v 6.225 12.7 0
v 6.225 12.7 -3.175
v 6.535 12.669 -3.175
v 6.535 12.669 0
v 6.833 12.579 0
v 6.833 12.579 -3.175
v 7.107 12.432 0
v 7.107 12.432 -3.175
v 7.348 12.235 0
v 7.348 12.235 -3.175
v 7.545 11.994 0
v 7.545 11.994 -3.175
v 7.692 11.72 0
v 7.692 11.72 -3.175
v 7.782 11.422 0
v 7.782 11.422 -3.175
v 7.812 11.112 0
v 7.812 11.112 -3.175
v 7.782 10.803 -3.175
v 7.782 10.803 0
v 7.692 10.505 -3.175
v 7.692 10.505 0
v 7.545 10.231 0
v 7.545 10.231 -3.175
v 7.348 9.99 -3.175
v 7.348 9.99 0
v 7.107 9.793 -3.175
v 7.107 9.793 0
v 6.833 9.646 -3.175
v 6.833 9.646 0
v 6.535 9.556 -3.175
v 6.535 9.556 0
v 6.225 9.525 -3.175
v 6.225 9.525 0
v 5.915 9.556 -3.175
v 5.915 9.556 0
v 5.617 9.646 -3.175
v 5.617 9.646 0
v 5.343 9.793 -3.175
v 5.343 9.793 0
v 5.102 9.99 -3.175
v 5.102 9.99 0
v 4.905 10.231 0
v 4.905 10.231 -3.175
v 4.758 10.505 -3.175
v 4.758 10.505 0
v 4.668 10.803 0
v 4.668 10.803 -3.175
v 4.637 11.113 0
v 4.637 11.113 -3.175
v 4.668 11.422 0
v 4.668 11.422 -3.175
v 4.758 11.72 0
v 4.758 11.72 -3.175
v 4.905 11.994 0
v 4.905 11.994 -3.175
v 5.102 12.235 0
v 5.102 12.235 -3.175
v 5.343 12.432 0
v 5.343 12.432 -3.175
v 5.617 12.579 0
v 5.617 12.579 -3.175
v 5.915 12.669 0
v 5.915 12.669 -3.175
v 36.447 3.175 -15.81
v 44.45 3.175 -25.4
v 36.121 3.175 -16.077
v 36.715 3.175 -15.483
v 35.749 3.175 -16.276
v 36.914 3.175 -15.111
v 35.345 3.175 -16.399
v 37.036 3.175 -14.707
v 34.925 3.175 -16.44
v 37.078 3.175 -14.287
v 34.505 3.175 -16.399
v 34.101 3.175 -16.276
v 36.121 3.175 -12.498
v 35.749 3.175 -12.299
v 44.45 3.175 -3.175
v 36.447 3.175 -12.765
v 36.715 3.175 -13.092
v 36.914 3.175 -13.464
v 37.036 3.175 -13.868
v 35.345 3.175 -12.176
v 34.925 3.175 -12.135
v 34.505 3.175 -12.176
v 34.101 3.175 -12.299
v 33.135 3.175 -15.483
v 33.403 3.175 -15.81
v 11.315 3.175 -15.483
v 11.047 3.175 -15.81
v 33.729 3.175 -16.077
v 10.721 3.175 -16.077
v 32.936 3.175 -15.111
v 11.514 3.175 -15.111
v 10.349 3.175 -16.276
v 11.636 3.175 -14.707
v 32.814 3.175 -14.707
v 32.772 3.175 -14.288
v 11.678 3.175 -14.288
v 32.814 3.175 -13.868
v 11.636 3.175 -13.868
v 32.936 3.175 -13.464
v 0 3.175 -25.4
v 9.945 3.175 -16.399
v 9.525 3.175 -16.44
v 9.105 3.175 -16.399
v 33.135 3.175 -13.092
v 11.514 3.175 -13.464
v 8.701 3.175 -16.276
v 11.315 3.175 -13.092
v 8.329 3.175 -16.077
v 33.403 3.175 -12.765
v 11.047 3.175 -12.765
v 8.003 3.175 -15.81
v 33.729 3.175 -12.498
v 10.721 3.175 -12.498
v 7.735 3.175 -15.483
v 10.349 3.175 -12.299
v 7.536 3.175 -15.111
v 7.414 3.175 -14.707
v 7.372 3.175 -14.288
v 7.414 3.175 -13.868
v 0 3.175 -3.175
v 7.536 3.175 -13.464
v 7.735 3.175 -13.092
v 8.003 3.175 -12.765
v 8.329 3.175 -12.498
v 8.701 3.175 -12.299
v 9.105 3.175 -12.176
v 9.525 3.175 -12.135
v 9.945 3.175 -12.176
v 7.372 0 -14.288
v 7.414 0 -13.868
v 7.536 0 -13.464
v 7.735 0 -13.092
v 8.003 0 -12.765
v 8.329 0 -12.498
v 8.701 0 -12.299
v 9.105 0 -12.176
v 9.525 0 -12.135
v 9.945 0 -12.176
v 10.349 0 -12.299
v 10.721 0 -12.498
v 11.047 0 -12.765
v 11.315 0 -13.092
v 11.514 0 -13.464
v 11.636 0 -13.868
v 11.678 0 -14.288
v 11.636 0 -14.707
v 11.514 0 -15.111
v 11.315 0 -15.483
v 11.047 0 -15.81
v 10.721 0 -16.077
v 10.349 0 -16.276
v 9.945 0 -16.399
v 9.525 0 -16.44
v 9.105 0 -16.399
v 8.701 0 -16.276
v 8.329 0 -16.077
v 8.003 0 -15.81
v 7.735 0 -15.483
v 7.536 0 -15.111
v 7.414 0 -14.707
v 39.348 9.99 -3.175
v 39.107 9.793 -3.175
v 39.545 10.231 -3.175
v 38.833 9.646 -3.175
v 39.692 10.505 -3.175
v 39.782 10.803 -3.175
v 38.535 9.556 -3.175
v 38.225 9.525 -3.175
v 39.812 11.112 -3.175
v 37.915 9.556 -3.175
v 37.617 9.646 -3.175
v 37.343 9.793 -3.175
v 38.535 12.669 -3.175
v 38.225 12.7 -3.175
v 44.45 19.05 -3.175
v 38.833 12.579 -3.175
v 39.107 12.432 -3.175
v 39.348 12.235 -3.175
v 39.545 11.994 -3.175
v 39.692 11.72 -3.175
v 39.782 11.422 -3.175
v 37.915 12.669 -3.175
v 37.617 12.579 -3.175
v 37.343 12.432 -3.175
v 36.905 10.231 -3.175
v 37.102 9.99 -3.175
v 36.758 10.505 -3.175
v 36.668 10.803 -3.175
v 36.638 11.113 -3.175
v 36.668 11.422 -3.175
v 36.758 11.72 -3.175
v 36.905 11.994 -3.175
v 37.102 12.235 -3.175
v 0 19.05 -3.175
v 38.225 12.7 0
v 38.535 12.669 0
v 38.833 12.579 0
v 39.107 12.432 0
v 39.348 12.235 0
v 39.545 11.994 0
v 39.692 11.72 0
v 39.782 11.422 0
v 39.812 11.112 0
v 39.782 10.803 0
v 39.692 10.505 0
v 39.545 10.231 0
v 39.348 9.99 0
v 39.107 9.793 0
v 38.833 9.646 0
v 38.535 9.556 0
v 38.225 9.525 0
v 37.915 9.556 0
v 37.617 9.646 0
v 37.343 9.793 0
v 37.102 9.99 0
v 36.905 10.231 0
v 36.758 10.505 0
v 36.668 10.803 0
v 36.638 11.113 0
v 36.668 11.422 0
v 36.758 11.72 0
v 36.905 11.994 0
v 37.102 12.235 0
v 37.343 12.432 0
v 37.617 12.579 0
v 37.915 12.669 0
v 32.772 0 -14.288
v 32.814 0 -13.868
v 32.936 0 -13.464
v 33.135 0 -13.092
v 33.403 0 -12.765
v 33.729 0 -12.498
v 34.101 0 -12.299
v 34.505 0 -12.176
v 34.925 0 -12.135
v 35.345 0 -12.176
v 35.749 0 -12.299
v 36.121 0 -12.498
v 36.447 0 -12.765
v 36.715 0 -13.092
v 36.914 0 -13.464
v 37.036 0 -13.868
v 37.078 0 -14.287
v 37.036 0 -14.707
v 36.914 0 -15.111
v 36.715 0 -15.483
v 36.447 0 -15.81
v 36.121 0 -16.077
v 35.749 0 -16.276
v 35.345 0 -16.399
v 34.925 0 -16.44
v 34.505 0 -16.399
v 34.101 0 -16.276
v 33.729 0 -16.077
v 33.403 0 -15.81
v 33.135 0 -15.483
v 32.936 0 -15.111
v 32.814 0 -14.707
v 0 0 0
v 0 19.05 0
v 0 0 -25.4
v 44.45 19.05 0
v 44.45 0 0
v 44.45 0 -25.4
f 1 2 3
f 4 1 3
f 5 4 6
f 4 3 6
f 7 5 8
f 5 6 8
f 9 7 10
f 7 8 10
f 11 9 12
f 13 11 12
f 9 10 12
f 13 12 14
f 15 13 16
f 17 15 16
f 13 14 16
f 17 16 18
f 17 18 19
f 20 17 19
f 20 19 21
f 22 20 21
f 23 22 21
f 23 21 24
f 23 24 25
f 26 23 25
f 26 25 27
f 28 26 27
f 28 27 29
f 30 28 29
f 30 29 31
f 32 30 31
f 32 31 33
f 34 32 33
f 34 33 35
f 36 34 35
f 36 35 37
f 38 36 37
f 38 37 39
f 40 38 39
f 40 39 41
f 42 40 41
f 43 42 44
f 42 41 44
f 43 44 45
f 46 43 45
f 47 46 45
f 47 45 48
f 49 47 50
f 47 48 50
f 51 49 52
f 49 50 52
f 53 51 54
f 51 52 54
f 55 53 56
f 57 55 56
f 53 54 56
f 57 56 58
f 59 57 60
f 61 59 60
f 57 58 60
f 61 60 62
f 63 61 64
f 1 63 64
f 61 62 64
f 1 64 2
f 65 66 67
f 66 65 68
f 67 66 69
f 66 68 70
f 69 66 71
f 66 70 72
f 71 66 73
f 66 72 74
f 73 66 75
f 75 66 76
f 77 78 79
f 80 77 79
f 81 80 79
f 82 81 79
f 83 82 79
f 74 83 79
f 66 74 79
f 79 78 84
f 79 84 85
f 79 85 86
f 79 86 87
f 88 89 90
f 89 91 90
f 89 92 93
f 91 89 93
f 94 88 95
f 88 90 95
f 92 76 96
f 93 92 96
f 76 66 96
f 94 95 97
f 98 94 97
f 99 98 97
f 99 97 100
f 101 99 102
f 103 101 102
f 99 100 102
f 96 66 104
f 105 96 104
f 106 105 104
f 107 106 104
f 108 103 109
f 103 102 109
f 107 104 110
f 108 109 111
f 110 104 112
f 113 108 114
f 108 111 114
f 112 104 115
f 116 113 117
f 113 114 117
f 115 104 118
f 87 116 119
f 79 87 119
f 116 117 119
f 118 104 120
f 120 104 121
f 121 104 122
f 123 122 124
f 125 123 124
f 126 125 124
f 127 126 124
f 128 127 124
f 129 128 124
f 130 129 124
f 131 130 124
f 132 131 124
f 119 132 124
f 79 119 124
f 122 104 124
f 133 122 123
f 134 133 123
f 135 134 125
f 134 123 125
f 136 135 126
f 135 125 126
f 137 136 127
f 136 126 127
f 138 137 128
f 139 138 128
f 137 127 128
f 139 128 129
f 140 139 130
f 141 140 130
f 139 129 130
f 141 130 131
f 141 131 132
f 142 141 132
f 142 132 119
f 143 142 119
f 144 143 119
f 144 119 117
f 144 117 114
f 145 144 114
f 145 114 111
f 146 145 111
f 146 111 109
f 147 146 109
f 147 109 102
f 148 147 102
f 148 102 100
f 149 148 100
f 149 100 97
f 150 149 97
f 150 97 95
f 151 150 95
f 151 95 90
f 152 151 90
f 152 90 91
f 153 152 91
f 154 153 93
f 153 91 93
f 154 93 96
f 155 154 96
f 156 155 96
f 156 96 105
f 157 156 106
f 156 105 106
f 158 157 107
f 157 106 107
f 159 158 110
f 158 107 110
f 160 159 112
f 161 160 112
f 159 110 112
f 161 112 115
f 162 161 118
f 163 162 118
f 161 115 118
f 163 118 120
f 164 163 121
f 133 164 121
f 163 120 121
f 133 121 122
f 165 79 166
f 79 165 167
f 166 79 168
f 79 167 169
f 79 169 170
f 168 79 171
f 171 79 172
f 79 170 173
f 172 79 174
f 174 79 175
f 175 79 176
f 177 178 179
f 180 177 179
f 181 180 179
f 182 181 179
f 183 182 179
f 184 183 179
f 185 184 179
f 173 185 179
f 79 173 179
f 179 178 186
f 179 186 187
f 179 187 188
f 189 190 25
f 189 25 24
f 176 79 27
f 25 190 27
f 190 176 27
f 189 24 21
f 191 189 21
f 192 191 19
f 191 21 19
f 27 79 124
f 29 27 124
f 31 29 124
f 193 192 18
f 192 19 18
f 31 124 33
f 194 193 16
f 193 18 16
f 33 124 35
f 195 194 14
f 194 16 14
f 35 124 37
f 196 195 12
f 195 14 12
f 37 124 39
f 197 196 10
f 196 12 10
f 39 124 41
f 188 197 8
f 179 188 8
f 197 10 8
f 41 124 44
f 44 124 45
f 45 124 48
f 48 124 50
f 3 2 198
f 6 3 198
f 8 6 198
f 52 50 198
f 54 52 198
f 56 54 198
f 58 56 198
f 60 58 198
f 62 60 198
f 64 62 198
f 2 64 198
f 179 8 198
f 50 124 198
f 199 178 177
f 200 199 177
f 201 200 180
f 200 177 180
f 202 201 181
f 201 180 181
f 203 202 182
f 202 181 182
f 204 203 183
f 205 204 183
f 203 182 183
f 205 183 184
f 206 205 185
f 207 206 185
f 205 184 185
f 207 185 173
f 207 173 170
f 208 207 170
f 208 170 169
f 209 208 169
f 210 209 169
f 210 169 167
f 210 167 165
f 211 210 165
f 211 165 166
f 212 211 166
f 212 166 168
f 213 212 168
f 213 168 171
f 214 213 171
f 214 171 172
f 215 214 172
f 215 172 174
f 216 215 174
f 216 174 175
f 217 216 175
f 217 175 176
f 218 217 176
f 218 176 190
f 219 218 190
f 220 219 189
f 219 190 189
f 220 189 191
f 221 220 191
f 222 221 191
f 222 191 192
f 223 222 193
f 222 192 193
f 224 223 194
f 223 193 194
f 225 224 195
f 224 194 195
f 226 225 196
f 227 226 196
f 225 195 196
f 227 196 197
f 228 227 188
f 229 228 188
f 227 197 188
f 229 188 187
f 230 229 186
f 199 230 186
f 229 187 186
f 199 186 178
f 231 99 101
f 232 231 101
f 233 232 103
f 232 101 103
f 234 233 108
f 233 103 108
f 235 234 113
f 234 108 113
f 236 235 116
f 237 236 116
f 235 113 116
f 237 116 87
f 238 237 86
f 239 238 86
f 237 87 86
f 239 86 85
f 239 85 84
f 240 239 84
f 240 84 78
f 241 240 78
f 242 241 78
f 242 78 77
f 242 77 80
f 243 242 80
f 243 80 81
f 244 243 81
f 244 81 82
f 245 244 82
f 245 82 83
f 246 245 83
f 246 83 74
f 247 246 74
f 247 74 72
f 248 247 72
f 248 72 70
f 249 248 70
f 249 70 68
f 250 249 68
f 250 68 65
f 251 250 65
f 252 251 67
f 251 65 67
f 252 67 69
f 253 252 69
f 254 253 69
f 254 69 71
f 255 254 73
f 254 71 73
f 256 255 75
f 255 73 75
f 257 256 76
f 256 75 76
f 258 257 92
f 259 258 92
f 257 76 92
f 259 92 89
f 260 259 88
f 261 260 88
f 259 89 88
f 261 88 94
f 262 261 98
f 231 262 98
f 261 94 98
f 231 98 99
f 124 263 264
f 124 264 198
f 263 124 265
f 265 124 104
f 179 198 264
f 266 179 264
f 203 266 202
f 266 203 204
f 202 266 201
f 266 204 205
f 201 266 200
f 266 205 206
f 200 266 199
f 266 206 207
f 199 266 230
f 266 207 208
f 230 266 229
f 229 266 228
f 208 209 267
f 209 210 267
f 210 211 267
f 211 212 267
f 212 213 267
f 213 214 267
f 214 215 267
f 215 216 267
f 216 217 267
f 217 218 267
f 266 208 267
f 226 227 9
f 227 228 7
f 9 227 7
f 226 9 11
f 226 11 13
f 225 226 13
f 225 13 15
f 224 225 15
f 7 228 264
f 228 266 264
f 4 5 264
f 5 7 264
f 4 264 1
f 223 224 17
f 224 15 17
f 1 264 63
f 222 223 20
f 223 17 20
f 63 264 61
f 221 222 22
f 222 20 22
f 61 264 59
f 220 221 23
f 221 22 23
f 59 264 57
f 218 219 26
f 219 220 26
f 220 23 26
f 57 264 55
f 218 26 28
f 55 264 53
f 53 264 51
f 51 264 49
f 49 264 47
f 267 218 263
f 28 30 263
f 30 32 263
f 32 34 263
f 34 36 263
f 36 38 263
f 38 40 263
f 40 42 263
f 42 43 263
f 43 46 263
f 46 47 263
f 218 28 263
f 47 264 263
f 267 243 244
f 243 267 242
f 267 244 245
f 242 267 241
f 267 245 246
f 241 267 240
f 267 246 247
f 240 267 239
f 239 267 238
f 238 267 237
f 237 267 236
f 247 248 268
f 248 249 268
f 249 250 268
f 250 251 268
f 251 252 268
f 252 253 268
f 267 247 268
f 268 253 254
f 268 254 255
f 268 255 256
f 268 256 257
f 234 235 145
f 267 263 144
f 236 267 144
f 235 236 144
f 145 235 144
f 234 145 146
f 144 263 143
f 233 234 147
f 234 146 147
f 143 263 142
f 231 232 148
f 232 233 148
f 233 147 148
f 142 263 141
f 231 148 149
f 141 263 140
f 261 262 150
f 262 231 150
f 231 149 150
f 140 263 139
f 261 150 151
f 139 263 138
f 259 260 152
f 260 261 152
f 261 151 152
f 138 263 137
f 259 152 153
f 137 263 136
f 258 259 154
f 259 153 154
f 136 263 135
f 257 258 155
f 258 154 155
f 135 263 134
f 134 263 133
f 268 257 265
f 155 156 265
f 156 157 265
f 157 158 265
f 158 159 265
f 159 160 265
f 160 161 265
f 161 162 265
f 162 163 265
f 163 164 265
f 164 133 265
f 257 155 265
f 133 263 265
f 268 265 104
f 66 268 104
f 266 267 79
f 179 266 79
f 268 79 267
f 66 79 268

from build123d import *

# Parameters (mm, degrees)
BOSS_EXTRUDE1_DEPTH = 44.45
SKETCH3_R           = 1.5875
CUT_EXTRUDE1_DEPTH  = 25.4
CUT_EXTRUDE2_DEPTH  = 25.4


with BuildPart() as part:
    # Sketch1 → Boss-Extrude1 (new body)
    with BuildSketch(Plane(origin=(0, 0, 0), x_dir=(0, 0, -1), z_dir=(1, 0, 0))):
        Polygon((0, 19.05), (0, 0), (25.4, 0), (25.4, 3.175), (3.175, 3.175), (3.175, 19.05), align=None)
    extrude(amount=BOSS_EXTRUDE1_DEPTH)

    # Sketch3 → Cut-Extrude1 (cut)
    with BuildSketch(Plane(origin=(0, 0, -3.175), x_dir=(-1, 0, 0), z_dir=(0, 0, -1))):
        with Locations(Location((-38.225, 11.1125, 0), (0, 0, 90))):
            Circle(SKETCH3_R)
        with Locations(Location((-6.225, 11.1125, 0), (0, 0, 90))):
            Circle(SKETCH3_R)
    extrude(amount=-CUT_EXTRUDE1_DEPTH, mode=Mode.SUBTRACT)

    # Sketch4 → Cut-Extrude2 (cut)
    with BuildSketch(Plane(origin=(0, 3.175, 0), x_dir=(1, 0, 0), z_dir=(0, 1, 0))):
        with BuildLine():
            ThreePointArc((37.07765, 14.2875), (34.925, 16.44015), (32.77235, 14.2875))
            Line((32.77235, 14.2875), (34.925, 14.2875))
            Line((34.925, 14.2875), (37.07765, 14.2875))
        make_face()
        with BuildLine():
            Line((34.925, 14.2875), (32.77235, 14.2875))
            ThreePointArc((32.77235, 14.2875), (34.925, 12.13485), (37.07765, 14.2875))
            Line((37.07765, 14.2875), (34.925, 14.2875))
        make_face()
        with BuildLine():
            Line((7.37235, 14.2875), (9.525, 14.2875))
            Line((9.525, 14.2875), (11.67765, 14.2875))
            ThreePointArc((11.67765, 14.2875), (9.525, 16.44015), (7.37235, 14.2875))
        make_face()
        with BuildLine():
            Line((11.67765, 14.2875), (9.525, 14.2875))
            Line((9.525, 14.2875), (7.37235, 14.2875))
            ThreePointArc((7.37235, 14.2875), (9.525, 12.13485), (11.67765, 14.2875))
        make_face()
    extrude(amount=-CUT_EXTRUDE2_DEPTH, mode=Mode.SUBTRACT)


solid = part.part
